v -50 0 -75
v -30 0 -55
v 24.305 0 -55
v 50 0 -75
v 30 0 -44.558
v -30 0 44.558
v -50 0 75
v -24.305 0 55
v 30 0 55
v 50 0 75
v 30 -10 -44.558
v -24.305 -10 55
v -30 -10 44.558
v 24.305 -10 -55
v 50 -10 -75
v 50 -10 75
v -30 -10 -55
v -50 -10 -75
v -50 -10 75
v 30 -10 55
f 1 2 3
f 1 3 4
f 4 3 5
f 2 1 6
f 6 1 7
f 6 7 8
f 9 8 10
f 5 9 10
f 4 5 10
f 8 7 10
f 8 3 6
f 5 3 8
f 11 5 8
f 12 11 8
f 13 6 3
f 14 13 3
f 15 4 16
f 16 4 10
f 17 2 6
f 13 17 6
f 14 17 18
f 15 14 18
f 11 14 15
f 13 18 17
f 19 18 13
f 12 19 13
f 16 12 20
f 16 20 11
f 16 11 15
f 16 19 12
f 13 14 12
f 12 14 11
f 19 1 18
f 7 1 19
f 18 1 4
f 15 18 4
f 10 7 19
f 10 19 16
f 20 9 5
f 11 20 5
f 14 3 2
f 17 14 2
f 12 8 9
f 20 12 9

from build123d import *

# Parameters (mm, degrees)
F0_W     = 100
F0_H     = 150
F1_DEPTH = 10


with BuildPart() as f1:
    # F0 (on Front) → F1 (new body)
    with BuildSketch(Plane.XZ):
        Rectangle(F0_W, F0_H)
        Polygon((-30, -55), (-30, 44.558363), (24.304562, -55), align=None, mode=Mode.SUBTRACT)
        Polygon((-24.304562, 55), (30, 55), (30, -44.558363), align=None, mode=Mode.SUBTRACT)
    extrude(amount=F1_DEPTH)


solid = f1.part
